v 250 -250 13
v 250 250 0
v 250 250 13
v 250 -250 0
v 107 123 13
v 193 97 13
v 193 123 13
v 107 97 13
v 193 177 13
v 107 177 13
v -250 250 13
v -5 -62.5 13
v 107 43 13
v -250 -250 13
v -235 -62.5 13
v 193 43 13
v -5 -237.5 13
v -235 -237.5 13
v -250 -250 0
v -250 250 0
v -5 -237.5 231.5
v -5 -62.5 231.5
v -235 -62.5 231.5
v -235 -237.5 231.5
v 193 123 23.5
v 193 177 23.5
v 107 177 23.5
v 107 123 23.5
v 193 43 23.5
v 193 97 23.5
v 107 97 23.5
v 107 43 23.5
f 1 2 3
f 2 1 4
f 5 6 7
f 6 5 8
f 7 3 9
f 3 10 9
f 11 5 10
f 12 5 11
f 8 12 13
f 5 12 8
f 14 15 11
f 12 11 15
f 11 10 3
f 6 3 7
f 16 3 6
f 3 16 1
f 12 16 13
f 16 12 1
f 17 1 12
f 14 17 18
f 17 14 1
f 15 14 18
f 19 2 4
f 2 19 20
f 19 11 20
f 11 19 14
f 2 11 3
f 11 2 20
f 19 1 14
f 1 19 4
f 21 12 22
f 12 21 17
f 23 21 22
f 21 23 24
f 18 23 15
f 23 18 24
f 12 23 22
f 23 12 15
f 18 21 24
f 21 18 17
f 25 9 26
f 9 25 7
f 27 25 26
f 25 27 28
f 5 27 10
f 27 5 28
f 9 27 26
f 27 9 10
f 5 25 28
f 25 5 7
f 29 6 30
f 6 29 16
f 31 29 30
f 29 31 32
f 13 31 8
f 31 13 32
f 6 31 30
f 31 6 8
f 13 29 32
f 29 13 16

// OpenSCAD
module ControlModule(lod=0){
    // base
    translate([0, 0, 13/2]){
        cube([500, 500, 13], center=true); 
        
        // batery
        color([1, 0, 0])
        translate([-120, -150, 225/2])
        cube([230, 175, 225], center=true); 
        
        
        // raspberry
        translate([150, 150, 17/2])
        color([0, 1, 0])
        cube([86, 54, 17], center=true);
        
        translate([150, 70, 17/2])
        color([0, 0, 1])
        cube([86, 54, 17], center=true);
    }
}



ControlModule(lod=0);
